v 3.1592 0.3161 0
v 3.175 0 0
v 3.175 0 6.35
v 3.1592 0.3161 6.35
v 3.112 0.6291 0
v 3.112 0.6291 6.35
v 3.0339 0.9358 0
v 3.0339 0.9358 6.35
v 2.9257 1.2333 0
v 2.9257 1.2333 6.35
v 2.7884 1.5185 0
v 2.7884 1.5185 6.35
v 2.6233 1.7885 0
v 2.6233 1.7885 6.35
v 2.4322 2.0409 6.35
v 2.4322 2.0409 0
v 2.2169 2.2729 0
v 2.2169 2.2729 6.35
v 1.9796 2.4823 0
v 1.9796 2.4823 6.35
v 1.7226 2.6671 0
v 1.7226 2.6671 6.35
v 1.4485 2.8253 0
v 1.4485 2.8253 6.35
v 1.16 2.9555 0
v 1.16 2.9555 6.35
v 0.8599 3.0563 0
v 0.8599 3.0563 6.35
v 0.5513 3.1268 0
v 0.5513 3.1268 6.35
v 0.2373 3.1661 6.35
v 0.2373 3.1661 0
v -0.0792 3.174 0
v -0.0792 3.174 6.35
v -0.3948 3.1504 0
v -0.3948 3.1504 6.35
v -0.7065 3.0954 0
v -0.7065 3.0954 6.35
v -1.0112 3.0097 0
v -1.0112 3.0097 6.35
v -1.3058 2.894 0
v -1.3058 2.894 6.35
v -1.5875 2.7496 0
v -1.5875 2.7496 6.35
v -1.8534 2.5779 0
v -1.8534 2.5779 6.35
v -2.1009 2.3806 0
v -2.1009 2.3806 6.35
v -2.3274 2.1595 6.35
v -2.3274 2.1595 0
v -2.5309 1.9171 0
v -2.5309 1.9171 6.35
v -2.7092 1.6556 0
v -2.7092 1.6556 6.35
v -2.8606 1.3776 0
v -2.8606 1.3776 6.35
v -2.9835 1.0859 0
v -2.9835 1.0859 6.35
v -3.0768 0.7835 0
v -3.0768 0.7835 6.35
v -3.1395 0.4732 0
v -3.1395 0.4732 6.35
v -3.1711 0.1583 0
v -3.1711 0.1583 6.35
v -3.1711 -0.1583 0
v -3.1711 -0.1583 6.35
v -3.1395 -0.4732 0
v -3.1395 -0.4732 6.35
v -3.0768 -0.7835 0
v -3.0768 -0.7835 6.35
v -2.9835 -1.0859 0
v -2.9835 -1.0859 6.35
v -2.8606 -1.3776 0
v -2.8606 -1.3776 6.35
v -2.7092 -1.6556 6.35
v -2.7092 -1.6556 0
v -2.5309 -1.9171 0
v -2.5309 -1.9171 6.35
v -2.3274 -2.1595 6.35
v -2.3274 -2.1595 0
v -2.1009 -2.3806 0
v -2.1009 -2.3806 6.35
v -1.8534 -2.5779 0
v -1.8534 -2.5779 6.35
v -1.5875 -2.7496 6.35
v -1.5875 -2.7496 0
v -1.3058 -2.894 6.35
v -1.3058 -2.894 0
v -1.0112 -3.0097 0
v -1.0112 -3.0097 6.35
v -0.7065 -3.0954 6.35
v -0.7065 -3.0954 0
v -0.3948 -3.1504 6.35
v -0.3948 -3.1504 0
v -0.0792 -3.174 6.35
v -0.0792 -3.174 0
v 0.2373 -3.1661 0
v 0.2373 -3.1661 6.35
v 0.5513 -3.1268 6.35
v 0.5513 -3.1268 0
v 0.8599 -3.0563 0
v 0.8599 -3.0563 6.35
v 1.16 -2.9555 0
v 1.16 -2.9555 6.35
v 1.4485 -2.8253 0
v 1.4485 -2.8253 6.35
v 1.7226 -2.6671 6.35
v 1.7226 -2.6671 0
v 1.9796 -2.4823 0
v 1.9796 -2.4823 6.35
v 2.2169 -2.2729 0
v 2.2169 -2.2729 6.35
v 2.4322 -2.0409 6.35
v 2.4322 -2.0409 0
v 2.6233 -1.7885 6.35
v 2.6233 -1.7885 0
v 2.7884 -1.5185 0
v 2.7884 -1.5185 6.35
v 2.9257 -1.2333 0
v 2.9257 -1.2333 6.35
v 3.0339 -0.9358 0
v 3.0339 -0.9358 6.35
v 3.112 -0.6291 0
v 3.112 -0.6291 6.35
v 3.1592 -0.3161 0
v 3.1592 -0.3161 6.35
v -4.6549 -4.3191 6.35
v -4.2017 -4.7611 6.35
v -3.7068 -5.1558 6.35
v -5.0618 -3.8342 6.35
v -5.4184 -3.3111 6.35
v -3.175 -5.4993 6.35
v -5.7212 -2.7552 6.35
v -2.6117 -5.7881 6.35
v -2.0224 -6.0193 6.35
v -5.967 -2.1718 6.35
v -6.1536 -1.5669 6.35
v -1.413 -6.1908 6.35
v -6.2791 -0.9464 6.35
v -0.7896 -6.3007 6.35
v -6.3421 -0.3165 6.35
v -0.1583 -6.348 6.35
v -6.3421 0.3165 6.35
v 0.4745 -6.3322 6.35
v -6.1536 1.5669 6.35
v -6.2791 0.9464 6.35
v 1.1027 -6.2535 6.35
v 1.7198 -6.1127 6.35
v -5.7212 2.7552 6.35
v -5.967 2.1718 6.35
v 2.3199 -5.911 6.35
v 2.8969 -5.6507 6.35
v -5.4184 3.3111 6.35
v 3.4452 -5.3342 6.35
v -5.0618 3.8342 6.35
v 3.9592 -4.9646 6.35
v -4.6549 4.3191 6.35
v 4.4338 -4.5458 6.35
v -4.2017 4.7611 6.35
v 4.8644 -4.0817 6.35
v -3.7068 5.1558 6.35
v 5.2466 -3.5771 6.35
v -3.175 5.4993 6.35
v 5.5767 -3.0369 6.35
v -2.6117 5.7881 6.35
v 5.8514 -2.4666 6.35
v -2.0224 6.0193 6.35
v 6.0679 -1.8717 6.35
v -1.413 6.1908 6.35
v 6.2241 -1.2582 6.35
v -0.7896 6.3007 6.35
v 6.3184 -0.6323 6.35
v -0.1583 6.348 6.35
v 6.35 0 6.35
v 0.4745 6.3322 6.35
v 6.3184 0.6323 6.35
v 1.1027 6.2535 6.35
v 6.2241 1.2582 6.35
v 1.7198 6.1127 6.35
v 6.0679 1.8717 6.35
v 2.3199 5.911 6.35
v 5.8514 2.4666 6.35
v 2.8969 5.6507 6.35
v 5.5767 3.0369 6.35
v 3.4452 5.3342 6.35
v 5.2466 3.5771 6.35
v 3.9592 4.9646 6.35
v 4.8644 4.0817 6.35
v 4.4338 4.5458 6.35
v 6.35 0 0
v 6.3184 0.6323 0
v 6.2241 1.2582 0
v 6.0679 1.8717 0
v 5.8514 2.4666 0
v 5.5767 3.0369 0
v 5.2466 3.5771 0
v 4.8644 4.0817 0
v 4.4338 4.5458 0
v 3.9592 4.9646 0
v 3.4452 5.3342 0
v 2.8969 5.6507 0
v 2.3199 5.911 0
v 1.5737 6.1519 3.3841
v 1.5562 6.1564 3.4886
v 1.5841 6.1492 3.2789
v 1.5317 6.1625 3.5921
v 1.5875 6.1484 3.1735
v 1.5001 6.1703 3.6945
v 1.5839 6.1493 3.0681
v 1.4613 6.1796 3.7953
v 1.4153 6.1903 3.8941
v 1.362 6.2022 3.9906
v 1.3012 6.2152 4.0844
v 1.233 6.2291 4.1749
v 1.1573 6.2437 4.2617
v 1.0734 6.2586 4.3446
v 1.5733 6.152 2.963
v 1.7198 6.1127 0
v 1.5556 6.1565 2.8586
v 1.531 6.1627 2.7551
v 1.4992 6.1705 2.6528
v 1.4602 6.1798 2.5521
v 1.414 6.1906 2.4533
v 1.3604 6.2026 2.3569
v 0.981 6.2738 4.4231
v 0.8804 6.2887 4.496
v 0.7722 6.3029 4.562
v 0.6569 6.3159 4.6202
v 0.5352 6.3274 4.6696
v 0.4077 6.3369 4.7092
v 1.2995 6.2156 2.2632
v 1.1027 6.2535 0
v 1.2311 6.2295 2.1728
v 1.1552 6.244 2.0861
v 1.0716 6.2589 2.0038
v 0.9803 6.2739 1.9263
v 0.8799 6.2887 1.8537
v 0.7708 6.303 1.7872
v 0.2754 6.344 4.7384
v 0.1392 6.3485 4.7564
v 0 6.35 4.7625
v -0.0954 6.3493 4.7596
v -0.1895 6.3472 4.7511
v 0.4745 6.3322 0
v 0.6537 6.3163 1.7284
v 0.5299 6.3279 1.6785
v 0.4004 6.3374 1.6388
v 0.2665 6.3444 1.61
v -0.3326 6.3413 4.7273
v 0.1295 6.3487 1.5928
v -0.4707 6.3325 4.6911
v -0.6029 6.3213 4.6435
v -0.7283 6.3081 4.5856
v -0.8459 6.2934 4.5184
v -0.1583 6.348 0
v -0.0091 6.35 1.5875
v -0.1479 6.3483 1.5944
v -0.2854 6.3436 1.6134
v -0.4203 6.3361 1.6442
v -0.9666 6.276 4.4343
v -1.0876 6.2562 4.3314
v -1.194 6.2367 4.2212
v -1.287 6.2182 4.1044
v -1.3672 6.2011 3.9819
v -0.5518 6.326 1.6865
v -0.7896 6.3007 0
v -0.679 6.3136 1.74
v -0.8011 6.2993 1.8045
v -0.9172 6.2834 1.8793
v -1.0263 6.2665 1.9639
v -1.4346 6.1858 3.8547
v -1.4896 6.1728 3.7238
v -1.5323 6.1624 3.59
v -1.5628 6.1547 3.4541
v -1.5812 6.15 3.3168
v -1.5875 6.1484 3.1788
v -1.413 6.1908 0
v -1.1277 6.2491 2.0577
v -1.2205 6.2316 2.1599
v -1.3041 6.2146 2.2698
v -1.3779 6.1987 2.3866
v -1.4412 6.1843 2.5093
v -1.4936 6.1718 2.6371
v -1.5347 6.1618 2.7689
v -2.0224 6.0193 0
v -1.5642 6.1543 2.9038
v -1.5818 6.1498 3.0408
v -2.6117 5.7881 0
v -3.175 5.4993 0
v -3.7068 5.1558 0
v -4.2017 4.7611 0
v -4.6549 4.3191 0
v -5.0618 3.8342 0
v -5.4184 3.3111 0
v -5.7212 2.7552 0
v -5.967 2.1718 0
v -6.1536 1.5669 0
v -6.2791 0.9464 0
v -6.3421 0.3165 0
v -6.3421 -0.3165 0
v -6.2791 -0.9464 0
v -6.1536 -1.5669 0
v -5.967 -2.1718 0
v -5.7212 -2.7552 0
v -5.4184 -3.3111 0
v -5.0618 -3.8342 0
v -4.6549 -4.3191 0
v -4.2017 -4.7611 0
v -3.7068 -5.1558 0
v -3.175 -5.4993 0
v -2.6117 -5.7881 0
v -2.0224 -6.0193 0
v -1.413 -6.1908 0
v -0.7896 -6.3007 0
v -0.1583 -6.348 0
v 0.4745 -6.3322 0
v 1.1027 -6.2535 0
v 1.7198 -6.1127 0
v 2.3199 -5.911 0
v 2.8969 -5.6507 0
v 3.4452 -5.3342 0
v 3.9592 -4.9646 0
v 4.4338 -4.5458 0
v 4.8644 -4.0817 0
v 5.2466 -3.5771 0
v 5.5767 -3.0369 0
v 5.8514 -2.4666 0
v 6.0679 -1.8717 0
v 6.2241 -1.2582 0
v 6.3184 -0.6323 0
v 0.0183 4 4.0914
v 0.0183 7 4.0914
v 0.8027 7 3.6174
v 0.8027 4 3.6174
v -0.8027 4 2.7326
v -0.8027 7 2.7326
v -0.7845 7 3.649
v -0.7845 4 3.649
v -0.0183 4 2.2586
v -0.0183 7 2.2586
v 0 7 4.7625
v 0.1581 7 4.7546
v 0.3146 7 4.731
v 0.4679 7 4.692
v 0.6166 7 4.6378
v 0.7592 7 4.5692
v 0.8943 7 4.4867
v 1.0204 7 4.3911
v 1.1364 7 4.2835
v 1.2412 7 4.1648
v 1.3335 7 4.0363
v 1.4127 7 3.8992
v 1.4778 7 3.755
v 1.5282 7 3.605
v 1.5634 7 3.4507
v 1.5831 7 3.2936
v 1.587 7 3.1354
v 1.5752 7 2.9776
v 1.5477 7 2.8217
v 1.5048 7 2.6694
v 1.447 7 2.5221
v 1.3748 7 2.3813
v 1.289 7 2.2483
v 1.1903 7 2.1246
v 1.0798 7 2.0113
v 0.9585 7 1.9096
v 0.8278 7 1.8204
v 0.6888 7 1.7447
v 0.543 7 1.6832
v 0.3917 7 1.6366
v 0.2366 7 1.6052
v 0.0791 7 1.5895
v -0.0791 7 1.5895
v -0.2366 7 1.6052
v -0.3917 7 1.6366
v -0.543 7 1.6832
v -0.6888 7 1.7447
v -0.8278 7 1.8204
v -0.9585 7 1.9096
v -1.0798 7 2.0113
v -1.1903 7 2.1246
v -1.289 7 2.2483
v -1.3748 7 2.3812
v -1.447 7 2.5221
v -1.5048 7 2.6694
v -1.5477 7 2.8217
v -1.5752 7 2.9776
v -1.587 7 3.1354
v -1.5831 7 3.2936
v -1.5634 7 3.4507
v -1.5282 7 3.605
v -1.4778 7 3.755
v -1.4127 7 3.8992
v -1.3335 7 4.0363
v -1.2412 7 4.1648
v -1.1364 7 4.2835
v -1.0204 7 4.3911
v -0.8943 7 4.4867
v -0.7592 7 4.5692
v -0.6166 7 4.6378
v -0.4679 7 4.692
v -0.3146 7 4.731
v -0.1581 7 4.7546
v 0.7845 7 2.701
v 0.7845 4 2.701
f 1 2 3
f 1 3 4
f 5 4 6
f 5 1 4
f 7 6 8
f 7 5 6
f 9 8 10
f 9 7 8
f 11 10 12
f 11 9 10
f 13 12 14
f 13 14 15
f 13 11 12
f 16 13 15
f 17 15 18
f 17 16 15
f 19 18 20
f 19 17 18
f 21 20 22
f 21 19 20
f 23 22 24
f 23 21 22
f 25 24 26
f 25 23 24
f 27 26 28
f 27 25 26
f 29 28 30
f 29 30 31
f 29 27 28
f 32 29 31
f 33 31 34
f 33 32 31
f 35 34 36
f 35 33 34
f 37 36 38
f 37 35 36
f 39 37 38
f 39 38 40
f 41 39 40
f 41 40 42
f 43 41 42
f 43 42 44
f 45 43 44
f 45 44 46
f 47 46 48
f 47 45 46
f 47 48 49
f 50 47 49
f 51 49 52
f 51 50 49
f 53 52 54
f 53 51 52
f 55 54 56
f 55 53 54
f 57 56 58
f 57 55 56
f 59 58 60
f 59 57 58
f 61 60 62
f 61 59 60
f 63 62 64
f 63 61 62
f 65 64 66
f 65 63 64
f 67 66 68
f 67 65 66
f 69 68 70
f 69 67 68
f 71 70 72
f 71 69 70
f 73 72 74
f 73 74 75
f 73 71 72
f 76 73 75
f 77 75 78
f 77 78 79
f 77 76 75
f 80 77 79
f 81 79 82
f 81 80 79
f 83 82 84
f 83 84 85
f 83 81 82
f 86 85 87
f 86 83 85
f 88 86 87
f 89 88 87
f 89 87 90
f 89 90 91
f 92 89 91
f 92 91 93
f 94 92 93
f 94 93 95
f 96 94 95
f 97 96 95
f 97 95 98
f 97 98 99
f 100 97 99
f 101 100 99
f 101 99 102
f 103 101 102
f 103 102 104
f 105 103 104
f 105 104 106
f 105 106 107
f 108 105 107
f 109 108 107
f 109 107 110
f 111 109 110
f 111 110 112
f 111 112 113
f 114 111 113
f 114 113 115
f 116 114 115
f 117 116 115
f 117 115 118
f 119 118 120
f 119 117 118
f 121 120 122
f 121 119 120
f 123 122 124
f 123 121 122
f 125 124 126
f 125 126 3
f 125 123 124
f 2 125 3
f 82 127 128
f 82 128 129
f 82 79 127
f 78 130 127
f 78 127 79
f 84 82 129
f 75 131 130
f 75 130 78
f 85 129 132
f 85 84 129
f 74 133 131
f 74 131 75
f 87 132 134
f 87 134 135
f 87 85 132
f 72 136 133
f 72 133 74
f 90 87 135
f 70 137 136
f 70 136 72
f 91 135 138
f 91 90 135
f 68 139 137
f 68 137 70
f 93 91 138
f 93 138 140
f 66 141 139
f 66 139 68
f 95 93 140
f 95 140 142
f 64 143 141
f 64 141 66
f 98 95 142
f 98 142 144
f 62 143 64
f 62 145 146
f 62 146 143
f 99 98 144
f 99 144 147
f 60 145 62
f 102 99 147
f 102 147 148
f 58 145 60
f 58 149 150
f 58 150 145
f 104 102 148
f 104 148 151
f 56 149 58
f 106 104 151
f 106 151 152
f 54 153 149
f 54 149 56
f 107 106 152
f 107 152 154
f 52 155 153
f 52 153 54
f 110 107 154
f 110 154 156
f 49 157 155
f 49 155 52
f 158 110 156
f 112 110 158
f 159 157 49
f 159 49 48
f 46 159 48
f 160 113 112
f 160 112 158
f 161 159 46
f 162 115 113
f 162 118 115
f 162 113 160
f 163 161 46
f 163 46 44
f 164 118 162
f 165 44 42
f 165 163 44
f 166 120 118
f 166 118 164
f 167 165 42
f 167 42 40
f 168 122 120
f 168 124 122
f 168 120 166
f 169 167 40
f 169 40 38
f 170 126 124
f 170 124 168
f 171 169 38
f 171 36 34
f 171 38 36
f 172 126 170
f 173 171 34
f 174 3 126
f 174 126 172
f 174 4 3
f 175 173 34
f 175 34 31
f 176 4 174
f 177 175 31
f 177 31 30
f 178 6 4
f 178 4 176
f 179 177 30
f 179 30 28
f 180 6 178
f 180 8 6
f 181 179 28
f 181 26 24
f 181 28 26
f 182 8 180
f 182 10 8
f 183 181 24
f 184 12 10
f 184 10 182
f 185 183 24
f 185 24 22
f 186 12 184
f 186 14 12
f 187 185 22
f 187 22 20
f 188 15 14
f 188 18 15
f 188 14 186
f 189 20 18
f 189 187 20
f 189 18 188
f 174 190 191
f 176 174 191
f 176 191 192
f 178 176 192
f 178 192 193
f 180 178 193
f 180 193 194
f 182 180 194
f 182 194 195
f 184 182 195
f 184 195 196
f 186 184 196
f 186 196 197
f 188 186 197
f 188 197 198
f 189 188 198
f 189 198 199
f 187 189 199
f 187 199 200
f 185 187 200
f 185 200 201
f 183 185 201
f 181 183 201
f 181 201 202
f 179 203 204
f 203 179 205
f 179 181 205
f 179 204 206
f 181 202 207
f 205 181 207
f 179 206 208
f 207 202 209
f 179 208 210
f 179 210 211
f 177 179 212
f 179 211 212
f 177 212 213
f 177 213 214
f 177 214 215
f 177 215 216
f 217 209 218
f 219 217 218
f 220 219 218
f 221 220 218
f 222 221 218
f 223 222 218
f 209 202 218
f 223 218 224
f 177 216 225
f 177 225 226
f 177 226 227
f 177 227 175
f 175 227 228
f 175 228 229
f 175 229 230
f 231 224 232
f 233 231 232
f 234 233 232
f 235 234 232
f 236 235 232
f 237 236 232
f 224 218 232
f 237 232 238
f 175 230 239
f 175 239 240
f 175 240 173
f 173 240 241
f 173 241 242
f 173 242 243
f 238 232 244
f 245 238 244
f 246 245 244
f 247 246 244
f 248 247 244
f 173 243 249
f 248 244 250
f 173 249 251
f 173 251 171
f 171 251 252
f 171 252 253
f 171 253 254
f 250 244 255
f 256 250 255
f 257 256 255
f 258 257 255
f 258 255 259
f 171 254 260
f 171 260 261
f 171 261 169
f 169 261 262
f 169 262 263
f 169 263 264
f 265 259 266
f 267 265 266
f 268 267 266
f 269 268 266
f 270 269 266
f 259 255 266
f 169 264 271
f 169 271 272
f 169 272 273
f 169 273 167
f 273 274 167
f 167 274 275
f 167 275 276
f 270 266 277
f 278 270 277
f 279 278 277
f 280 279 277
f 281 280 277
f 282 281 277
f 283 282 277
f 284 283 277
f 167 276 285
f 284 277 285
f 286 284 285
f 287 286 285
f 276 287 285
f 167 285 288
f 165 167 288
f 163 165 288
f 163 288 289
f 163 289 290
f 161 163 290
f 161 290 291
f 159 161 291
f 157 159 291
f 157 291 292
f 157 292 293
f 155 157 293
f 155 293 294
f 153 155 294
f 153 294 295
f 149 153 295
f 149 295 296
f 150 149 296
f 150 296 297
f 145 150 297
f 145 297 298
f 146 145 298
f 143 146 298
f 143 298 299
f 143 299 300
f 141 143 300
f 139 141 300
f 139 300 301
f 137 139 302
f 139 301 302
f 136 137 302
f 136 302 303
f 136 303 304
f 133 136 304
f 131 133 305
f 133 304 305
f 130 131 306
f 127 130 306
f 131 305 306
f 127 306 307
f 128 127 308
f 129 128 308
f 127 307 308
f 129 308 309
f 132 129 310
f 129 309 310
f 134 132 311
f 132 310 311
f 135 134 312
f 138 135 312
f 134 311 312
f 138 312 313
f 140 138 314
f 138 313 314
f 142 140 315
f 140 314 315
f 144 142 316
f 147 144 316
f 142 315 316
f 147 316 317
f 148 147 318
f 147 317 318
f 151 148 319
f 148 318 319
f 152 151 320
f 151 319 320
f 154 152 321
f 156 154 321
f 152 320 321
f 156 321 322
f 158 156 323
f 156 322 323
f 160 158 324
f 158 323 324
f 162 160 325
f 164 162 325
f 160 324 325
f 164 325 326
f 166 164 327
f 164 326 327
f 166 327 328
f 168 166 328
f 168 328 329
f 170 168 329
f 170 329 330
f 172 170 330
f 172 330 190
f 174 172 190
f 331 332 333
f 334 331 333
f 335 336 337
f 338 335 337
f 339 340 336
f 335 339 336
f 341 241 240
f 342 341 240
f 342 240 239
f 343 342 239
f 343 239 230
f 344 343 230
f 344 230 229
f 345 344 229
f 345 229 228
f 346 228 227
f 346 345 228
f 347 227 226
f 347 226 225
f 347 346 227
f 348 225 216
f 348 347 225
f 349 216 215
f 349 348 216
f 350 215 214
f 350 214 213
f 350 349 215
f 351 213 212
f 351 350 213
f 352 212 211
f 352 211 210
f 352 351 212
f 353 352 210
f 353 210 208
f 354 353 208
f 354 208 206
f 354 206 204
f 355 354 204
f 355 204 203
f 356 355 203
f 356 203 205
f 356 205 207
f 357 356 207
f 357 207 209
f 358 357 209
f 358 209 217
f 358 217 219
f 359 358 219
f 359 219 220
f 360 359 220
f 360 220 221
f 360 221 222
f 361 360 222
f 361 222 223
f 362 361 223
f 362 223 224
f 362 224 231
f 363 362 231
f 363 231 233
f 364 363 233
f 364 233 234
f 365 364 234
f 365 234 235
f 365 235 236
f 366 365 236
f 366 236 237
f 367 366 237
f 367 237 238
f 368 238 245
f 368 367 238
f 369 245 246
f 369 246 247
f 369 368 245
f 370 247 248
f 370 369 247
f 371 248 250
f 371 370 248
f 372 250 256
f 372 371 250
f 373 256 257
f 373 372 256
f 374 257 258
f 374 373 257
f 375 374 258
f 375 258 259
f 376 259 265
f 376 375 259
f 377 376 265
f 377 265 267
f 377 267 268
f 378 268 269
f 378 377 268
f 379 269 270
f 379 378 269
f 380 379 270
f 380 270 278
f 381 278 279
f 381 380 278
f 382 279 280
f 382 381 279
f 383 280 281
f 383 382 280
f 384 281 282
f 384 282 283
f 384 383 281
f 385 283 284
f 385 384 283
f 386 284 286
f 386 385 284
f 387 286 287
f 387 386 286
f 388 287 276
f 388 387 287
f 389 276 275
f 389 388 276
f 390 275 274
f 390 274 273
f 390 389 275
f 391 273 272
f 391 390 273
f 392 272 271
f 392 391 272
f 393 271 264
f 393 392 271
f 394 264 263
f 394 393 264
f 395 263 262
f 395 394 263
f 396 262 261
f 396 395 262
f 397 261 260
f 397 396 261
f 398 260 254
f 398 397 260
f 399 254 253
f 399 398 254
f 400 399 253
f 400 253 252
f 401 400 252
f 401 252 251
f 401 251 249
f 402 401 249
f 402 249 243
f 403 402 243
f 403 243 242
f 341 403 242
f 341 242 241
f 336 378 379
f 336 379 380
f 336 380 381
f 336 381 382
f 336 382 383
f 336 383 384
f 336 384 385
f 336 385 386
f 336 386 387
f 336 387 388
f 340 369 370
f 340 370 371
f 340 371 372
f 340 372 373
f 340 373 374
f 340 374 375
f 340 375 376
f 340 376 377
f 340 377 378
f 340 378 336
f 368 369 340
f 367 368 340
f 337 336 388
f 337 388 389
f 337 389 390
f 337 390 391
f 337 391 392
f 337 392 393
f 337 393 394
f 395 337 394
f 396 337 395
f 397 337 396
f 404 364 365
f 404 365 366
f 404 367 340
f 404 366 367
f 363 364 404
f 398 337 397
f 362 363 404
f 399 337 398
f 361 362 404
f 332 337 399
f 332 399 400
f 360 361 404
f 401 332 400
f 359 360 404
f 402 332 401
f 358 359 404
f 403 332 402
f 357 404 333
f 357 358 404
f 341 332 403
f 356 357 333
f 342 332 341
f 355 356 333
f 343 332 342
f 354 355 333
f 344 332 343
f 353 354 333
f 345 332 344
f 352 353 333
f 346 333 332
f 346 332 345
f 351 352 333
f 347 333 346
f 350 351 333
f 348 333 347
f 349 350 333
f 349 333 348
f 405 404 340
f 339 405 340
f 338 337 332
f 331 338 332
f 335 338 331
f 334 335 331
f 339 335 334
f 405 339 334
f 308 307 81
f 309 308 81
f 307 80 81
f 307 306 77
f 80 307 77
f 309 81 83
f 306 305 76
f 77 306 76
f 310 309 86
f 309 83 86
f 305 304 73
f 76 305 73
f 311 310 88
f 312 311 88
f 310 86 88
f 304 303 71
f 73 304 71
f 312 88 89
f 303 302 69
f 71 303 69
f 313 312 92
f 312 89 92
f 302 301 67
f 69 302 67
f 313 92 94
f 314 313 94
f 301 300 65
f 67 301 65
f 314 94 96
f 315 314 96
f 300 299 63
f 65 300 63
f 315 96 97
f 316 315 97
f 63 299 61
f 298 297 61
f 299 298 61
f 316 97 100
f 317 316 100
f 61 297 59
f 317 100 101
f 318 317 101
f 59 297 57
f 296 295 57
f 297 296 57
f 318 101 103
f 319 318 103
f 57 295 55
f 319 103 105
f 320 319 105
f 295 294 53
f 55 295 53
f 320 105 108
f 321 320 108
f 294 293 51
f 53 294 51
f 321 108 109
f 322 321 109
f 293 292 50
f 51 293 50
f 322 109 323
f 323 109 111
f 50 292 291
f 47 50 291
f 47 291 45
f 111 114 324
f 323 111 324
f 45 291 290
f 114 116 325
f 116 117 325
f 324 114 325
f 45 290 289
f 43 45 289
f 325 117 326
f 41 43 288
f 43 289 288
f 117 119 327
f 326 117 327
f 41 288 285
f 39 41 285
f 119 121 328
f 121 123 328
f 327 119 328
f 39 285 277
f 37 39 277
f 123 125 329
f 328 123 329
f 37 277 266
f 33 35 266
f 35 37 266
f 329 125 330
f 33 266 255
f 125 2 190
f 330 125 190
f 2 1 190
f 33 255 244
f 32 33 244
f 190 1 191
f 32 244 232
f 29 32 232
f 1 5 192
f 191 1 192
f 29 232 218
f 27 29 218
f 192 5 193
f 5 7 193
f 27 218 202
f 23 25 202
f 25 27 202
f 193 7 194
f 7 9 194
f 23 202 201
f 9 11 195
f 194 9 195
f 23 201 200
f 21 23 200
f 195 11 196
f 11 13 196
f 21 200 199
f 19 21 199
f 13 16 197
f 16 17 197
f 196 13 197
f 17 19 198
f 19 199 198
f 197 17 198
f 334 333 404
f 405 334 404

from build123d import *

# Parameters (mm, degrees)
SKETCH1_R            = 6.35
SKETCH1_R_2          = 3.175
BODY_DEPTH           = 6.35
SET_SCREW_REACH      = 18.089
SET_SCREW_END_RADIUS = 6.35
SKETCH2_R            = 1.5875
HEX_KEY_DEPTH        = 3


with BuildPart() as part:
    # Sketch1 → Body (new body)
    with BuildSketch(Plane.XY):
        Circle(SKETCH1_R)
        Circle(SKETCH1_R_2, mode=Mode.SUBTRACT)
    extrude(amount=BODY_DEPTH)

    # Set Screw: up to this cylinder (the profile starts outside it)
    set_screw_end = Plane(origin=(0, 0, 3.175), z_dir=(0, 0, -1)) * Cylinder(SET_SCREW_END_RADIUS, 49.878, mode=Mode.PRIVATE)
    # Sketch2 → Set Screw (add, up to the surface)
    with BuildSketch(Plane(origin=(0, 7, 0), x_dir=(1, 0, 0), z_dir=(0, 1, 0)), mode=Mode.PRIVATE) as set_screw_sk1:
        with Locations(Location((0, -3.175, 0), (0, 0, 270))):
            Circle(SKETCH2_R)
    set_screw_tool1 = extrude(set_screw_sk1.sketch, amount=-SET_SCREW_REACH, mode=Mode.PRIVATE) - set_screw_end
    add(set_screw_tool1.solids().sort_by_distance((0, 7, 3.175))[0])

    # Sketch3 → Hex Key (cut)
    with BuildSketch(Plane(origin=(0, 7, 0), x_dir=(1, 0, 0), z_dir=(0, 1, 0))):
        Polygon((0.802721832, -3.617368334), (0.784463132, -2.701006668), (-0.018258701, -2.258638334), (-0.802721832, -2.732631666), (-0.784463132, -3.648993332), (0.018258701, -4.091361666), align=None)
    extrude(amount=-HEX_KEY_DEPTH, mode=Mode.SUBTRACT)


solid = part.part
